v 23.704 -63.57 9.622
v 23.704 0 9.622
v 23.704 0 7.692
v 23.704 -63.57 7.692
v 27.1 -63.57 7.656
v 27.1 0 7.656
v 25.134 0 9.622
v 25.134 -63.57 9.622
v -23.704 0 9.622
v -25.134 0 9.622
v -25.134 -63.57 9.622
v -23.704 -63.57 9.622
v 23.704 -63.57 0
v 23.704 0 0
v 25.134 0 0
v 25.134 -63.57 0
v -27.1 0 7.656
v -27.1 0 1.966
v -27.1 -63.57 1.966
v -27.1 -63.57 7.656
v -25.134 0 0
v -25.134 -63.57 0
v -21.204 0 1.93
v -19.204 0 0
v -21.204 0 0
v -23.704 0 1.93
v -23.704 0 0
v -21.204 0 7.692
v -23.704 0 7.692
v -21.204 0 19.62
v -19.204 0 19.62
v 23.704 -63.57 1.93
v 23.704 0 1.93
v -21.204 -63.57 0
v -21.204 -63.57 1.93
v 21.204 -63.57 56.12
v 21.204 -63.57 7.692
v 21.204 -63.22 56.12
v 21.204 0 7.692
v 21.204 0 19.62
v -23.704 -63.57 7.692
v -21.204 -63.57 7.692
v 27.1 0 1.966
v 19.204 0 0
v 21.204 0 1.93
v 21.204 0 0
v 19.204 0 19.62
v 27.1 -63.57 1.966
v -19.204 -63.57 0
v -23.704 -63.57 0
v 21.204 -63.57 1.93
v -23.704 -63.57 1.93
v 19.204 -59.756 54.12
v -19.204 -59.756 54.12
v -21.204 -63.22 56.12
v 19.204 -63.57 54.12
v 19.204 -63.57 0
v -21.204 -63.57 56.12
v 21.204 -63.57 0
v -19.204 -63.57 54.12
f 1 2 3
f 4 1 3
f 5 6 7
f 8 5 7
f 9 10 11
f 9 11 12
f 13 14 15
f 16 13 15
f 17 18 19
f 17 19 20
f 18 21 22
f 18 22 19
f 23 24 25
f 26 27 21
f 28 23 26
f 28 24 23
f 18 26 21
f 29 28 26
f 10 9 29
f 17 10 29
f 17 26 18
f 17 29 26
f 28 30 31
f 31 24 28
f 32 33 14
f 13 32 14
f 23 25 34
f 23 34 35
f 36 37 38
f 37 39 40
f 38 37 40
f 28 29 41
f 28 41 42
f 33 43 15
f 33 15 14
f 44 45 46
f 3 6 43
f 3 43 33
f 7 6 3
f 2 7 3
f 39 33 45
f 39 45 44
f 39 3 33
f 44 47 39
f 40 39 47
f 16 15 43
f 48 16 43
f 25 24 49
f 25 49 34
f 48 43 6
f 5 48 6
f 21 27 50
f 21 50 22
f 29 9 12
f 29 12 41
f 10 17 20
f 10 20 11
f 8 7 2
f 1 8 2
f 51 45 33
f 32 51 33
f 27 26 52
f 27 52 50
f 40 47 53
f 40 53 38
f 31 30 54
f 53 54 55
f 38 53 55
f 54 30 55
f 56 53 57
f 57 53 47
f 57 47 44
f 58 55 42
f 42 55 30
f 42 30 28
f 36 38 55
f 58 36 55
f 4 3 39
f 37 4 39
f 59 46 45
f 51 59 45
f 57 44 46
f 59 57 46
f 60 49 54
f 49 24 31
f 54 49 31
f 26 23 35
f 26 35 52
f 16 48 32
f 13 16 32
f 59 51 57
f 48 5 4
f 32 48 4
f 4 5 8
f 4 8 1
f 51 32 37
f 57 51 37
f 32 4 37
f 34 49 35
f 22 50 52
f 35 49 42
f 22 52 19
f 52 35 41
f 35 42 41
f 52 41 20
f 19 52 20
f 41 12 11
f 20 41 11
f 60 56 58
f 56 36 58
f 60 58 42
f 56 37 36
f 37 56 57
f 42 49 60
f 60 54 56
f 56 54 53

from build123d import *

# Parameters (mm, degrees)
SKETCH_W     = 2
SKETCH_H     = 46.5
SKETCH_W_2   = 38.408486
SKETCH_H_2   = 2
PAD_DEPTH    = 63.57
POCKET_DEPTH = 48.305243


with BuildPart() as part:
    # Sketch → Pad (new body)
    with BuildSketch(Plane.XZ):
        Polygon((-21.204243, 0), (-21.204243, 1.93), (-23.704243, 1.93), (-23.704243, 0), (-25.134243, 0), (-27.1, 1.965757), (-27.1, 7.655757), (-25.134243, 9.621514), (-23.704243, 9.621514), (-23.704243, 7.691514), (-21.204243, 7.691514), (-21.204243, 9.62), (-19.204243, 9.62), (-19.204243, 0), align=None)
        Polygon((19.204243, 9.62), (19.204243, 0), (21.204243, 0), (21.204243, 1.93), (23.704243, 1.93), (23.704243, 0), (25.134243, 0), (27.1, 1.965757), (27.1, 7.655757), (25.134243, 9.621514), (23.704243, 9.621514), (23.704243, 7.691514), (21.204243, 7.691514), (21.204243, 9.62), align=None)
        with Locations((20.204243, 32.87)):
            Rectangle(SKETCH_W, SKETCH_H)
        with Locations((-20.204243, 32.87)):
            Rectangle(SKETCH_W, SKETCH_H)
        with Locations((0, 55.12)):
            Rectangle(SKETCH_W_2, SKETCH_H_2)
    extrude(amount=PAD_DEPTH)

    # Sketch001 (on Face26 of Pad) → Pocket (cut, through all)
    with BuildSketch(Plane(origin=(-21.204243, 0, 0), x_dir=(0, 0, -1), z_dir=(-1, 0, 0))):
        Polygon((-19.62, 0), (-56.62, 64.08588), (-56.62, 0), align=None)
    extrude(amount=-POCKET_DEPTH, mode=Mode.SUBTRACT)


solid = part.part
